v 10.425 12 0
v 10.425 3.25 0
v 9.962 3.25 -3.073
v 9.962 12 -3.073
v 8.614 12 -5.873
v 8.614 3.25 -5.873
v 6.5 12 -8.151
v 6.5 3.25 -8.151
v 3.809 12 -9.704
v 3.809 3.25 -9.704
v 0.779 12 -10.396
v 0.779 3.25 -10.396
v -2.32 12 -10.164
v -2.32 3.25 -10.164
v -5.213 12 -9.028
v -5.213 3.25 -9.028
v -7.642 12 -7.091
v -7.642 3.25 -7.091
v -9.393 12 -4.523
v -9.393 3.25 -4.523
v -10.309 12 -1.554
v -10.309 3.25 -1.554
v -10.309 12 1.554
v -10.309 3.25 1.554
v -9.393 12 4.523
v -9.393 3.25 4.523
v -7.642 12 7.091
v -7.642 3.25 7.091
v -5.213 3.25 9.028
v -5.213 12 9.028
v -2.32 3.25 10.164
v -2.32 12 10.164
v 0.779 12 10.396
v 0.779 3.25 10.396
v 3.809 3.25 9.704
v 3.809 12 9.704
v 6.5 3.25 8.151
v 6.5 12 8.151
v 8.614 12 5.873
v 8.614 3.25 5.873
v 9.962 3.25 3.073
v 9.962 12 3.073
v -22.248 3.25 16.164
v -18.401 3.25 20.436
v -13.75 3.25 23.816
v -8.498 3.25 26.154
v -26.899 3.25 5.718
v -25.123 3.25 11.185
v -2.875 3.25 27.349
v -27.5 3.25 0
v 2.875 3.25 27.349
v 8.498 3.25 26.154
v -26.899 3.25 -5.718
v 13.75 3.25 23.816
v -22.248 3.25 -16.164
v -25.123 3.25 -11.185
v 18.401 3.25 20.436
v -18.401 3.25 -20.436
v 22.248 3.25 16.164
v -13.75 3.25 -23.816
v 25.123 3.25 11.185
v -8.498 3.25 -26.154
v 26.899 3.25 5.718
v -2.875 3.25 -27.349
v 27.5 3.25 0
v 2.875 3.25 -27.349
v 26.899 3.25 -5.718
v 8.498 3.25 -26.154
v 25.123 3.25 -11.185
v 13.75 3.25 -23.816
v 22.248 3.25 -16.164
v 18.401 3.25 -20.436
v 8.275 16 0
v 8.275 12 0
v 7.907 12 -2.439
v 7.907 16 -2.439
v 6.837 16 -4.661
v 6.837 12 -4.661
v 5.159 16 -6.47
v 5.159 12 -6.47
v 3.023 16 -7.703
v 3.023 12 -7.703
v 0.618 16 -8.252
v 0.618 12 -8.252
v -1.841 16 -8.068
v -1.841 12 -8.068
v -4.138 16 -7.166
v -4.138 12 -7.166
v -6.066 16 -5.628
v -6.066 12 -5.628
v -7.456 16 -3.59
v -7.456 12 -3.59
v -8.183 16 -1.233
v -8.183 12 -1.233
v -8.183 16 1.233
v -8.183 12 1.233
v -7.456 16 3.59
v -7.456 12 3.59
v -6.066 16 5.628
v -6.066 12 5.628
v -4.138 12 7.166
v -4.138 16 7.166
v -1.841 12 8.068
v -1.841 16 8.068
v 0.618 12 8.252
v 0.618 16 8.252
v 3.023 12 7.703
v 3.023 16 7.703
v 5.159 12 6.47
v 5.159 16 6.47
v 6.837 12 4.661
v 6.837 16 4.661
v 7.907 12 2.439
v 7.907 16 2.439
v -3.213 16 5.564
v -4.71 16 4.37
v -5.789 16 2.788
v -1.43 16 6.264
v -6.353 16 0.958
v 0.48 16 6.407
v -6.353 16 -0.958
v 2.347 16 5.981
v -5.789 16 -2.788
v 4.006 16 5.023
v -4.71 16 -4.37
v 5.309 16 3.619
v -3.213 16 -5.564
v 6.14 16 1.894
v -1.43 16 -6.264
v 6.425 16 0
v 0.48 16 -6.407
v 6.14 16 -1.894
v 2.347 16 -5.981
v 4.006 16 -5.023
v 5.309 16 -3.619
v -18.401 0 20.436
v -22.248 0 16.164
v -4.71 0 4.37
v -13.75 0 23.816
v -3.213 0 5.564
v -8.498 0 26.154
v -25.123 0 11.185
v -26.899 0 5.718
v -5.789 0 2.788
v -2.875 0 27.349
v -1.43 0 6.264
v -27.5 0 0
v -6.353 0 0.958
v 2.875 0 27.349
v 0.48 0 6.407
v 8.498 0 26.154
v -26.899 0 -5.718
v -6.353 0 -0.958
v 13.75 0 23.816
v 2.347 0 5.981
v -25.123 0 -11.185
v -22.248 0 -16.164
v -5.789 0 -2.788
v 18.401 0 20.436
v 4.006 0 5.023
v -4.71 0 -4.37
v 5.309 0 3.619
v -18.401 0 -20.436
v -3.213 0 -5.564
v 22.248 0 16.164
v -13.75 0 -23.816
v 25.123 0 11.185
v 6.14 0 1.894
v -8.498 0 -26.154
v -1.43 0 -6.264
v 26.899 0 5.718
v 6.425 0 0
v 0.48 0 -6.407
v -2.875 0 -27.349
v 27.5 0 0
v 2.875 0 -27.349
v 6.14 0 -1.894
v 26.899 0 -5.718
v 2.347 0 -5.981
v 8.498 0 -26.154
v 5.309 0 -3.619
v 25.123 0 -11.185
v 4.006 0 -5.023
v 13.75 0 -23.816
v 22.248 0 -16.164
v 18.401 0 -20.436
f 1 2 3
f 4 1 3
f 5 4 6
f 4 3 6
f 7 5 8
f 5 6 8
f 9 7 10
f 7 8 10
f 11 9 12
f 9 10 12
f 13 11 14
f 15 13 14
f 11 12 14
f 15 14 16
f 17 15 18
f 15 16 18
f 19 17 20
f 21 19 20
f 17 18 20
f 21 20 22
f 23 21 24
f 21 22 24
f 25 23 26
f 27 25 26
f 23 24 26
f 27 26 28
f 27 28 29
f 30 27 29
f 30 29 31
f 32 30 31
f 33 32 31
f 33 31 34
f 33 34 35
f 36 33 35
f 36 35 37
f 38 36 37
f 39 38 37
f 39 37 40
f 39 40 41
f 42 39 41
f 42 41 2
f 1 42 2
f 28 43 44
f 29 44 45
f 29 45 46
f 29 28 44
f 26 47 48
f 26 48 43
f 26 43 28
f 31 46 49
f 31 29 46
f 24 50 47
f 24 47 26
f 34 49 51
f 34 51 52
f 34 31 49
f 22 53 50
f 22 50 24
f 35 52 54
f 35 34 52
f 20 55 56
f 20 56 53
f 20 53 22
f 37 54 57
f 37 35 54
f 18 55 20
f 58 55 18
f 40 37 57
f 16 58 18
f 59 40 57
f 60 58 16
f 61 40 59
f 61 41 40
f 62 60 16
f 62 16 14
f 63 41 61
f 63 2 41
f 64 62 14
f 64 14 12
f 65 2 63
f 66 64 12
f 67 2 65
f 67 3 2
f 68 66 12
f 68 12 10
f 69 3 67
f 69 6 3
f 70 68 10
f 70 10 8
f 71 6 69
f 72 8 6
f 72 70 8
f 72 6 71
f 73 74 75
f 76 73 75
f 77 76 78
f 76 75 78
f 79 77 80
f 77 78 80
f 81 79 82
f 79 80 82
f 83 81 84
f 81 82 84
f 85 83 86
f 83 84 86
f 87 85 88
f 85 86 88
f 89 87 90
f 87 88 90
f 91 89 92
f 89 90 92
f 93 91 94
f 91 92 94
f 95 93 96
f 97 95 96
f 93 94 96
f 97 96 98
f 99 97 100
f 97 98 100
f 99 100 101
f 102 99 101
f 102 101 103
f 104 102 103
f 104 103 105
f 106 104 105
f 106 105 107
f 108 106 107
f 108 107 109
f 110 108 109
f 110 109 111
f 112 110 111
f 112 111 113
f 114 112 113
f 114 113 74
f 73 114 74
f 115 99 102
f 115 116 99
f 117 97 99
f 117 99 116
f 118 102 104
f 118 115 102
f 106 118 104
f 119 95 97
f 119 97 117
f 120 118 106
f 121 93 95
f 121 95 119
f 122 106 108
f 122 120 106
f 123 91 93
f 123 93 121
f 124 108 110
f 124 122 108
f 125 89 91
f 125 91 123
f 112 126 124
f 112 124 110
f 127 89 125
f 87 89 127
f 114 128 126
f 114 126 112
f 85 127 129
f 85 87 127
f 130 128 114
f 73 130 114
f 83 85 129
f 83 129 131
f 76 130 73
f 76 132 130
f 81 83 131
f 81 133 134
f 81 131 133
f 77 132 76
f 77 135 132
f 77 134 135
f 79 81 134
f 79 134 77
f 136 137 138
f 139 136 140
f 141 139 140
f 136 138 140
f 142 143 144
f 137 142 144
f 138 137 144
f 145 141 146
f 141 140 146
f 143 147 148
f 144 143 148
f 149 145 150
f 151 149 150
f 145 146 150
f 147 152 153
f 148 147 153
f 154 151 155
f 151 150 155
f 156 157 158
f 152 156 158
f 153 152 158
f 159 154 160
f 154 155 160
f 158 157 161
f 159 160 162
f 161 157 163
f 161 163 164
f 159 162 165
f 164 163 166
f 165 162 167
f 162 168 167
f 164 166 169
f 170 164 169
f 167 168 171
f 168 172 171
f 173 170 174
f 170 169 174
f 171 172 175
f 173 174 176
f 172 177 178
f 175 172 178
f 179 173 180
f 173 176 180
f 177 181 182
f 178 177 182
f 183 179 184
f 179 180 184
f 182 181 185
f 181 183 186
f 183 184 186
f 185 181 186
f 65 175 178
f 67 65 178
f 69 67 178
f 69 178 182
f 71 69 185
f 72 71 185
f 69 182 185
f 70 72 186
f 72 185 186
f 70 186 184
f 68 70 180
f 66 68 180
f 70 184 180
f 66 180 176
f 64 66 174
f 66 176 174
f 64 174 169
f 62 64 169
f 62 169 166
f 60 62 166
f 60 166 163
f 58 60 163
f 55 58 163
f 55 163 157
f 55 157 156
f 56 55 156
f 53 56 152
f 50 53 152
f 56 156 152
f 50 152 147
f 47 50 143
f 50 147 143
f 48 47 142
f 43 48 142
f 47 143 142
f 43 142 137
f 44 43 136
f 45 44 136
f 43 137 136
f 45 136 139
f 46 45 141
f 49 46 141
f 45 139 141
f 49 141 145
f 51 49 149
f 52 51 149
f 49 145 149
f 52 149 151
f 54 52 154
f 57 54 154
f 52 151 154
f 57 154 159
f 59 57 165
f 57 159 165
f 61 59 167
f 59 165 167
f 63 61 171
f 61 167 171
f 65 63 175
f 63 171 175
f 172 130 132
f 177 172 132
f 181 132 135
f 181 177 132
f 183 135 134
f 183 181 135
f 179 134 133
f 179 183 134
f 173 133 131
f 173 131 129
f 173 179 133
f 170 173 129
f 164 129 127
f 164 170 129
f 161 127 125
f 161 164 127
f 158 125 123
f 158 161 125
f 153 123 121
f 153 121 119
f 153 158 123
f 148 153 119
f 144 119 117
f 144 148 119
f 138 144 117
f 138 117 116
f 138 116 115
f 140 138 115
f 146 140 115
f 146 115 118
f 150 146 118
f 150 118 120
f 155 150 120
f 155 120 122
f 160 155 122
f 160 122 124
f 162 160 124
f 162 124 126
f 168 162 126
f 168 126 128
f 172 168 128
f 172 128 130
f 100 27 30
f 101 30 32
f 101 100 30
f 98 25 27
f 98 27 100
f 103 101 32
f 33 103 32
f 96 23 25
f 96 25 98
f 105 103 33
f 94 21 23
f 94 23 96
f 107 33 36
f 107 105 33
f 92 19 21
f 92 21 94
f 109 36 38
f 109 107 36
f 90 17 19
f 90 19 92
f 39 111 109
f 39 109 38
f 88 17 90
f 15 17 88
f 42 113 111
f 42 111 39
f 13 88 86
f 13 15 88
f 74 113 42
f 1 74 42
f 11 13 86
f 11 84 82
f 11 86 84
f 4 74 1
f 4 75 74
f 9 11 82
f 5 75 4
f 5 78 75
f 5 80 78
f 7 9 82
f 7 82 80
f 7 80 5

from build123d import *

# Parameters (mm, degrees)
BASE_R              = 27.5
BASE_R_2            = 10.425
BASE_R_3            = 6.425
BASE_R_4            = 8.275
BOSS_EXTRUDE1_DEPTH = 3.25
BASE_4_R            = 8.275
BASE_4_R_2          = 6.425
BOSS_EXTRUDE2_DEPTH = 16
BASE_5_R            = 10.425
BASE_5_R_2          = 8.275
BOSS_EXTRUDE3_DEPTH = 12


with BuildPart() as part:
    # Base → Boss-Extrude1 (new body)
    with BuildSketch(Plane(origin=(0, 0, 0), x_dir=(1, 0, 0), z_dir=(0, 1, 0))):
        Circle(BASE_R)
        Circle(BASE_R_2, mode=Mode.SUBTRACT)
        Circle(BASE_R_2)
        Circle(BASE_R_3, mode=Mode.SUBTRACT)
        Circle(BASE_R_4)
        Circle(BASE_R_3, mode=Mode.SUBTRACT)
    extrude(amount=BOSS_EXTRUDE1_DEPTH)

    # Base_4 → Boss-Extrude2 (add)
    with BuildSketch(Plane(origin=(0, 0, 0), x_dir=(1, 0, 0), z_dir=(0, 1, 0))):
        Circle(BASE_4_R)
        Circle(BASE_4_R_2, mode=Mode.SUBTRACT)
    extrude(amount=BOSS_EXTRUDE2_DEPTH)

    # Base_5 → Boss-Extrude3 (add)
    with BuildSketch(Plane(origin=(0, 0, 0), x_dir=(1, 0, 0), z_dir=(0, 1, 0))):
        Circle(BASE_5_R)
        Circle(BASE_5_R_2, mode=Mode.SUBTRACT)
    extrude(amount=BOSS_EXTRUDE3_DEPTH)


solid = part.part
